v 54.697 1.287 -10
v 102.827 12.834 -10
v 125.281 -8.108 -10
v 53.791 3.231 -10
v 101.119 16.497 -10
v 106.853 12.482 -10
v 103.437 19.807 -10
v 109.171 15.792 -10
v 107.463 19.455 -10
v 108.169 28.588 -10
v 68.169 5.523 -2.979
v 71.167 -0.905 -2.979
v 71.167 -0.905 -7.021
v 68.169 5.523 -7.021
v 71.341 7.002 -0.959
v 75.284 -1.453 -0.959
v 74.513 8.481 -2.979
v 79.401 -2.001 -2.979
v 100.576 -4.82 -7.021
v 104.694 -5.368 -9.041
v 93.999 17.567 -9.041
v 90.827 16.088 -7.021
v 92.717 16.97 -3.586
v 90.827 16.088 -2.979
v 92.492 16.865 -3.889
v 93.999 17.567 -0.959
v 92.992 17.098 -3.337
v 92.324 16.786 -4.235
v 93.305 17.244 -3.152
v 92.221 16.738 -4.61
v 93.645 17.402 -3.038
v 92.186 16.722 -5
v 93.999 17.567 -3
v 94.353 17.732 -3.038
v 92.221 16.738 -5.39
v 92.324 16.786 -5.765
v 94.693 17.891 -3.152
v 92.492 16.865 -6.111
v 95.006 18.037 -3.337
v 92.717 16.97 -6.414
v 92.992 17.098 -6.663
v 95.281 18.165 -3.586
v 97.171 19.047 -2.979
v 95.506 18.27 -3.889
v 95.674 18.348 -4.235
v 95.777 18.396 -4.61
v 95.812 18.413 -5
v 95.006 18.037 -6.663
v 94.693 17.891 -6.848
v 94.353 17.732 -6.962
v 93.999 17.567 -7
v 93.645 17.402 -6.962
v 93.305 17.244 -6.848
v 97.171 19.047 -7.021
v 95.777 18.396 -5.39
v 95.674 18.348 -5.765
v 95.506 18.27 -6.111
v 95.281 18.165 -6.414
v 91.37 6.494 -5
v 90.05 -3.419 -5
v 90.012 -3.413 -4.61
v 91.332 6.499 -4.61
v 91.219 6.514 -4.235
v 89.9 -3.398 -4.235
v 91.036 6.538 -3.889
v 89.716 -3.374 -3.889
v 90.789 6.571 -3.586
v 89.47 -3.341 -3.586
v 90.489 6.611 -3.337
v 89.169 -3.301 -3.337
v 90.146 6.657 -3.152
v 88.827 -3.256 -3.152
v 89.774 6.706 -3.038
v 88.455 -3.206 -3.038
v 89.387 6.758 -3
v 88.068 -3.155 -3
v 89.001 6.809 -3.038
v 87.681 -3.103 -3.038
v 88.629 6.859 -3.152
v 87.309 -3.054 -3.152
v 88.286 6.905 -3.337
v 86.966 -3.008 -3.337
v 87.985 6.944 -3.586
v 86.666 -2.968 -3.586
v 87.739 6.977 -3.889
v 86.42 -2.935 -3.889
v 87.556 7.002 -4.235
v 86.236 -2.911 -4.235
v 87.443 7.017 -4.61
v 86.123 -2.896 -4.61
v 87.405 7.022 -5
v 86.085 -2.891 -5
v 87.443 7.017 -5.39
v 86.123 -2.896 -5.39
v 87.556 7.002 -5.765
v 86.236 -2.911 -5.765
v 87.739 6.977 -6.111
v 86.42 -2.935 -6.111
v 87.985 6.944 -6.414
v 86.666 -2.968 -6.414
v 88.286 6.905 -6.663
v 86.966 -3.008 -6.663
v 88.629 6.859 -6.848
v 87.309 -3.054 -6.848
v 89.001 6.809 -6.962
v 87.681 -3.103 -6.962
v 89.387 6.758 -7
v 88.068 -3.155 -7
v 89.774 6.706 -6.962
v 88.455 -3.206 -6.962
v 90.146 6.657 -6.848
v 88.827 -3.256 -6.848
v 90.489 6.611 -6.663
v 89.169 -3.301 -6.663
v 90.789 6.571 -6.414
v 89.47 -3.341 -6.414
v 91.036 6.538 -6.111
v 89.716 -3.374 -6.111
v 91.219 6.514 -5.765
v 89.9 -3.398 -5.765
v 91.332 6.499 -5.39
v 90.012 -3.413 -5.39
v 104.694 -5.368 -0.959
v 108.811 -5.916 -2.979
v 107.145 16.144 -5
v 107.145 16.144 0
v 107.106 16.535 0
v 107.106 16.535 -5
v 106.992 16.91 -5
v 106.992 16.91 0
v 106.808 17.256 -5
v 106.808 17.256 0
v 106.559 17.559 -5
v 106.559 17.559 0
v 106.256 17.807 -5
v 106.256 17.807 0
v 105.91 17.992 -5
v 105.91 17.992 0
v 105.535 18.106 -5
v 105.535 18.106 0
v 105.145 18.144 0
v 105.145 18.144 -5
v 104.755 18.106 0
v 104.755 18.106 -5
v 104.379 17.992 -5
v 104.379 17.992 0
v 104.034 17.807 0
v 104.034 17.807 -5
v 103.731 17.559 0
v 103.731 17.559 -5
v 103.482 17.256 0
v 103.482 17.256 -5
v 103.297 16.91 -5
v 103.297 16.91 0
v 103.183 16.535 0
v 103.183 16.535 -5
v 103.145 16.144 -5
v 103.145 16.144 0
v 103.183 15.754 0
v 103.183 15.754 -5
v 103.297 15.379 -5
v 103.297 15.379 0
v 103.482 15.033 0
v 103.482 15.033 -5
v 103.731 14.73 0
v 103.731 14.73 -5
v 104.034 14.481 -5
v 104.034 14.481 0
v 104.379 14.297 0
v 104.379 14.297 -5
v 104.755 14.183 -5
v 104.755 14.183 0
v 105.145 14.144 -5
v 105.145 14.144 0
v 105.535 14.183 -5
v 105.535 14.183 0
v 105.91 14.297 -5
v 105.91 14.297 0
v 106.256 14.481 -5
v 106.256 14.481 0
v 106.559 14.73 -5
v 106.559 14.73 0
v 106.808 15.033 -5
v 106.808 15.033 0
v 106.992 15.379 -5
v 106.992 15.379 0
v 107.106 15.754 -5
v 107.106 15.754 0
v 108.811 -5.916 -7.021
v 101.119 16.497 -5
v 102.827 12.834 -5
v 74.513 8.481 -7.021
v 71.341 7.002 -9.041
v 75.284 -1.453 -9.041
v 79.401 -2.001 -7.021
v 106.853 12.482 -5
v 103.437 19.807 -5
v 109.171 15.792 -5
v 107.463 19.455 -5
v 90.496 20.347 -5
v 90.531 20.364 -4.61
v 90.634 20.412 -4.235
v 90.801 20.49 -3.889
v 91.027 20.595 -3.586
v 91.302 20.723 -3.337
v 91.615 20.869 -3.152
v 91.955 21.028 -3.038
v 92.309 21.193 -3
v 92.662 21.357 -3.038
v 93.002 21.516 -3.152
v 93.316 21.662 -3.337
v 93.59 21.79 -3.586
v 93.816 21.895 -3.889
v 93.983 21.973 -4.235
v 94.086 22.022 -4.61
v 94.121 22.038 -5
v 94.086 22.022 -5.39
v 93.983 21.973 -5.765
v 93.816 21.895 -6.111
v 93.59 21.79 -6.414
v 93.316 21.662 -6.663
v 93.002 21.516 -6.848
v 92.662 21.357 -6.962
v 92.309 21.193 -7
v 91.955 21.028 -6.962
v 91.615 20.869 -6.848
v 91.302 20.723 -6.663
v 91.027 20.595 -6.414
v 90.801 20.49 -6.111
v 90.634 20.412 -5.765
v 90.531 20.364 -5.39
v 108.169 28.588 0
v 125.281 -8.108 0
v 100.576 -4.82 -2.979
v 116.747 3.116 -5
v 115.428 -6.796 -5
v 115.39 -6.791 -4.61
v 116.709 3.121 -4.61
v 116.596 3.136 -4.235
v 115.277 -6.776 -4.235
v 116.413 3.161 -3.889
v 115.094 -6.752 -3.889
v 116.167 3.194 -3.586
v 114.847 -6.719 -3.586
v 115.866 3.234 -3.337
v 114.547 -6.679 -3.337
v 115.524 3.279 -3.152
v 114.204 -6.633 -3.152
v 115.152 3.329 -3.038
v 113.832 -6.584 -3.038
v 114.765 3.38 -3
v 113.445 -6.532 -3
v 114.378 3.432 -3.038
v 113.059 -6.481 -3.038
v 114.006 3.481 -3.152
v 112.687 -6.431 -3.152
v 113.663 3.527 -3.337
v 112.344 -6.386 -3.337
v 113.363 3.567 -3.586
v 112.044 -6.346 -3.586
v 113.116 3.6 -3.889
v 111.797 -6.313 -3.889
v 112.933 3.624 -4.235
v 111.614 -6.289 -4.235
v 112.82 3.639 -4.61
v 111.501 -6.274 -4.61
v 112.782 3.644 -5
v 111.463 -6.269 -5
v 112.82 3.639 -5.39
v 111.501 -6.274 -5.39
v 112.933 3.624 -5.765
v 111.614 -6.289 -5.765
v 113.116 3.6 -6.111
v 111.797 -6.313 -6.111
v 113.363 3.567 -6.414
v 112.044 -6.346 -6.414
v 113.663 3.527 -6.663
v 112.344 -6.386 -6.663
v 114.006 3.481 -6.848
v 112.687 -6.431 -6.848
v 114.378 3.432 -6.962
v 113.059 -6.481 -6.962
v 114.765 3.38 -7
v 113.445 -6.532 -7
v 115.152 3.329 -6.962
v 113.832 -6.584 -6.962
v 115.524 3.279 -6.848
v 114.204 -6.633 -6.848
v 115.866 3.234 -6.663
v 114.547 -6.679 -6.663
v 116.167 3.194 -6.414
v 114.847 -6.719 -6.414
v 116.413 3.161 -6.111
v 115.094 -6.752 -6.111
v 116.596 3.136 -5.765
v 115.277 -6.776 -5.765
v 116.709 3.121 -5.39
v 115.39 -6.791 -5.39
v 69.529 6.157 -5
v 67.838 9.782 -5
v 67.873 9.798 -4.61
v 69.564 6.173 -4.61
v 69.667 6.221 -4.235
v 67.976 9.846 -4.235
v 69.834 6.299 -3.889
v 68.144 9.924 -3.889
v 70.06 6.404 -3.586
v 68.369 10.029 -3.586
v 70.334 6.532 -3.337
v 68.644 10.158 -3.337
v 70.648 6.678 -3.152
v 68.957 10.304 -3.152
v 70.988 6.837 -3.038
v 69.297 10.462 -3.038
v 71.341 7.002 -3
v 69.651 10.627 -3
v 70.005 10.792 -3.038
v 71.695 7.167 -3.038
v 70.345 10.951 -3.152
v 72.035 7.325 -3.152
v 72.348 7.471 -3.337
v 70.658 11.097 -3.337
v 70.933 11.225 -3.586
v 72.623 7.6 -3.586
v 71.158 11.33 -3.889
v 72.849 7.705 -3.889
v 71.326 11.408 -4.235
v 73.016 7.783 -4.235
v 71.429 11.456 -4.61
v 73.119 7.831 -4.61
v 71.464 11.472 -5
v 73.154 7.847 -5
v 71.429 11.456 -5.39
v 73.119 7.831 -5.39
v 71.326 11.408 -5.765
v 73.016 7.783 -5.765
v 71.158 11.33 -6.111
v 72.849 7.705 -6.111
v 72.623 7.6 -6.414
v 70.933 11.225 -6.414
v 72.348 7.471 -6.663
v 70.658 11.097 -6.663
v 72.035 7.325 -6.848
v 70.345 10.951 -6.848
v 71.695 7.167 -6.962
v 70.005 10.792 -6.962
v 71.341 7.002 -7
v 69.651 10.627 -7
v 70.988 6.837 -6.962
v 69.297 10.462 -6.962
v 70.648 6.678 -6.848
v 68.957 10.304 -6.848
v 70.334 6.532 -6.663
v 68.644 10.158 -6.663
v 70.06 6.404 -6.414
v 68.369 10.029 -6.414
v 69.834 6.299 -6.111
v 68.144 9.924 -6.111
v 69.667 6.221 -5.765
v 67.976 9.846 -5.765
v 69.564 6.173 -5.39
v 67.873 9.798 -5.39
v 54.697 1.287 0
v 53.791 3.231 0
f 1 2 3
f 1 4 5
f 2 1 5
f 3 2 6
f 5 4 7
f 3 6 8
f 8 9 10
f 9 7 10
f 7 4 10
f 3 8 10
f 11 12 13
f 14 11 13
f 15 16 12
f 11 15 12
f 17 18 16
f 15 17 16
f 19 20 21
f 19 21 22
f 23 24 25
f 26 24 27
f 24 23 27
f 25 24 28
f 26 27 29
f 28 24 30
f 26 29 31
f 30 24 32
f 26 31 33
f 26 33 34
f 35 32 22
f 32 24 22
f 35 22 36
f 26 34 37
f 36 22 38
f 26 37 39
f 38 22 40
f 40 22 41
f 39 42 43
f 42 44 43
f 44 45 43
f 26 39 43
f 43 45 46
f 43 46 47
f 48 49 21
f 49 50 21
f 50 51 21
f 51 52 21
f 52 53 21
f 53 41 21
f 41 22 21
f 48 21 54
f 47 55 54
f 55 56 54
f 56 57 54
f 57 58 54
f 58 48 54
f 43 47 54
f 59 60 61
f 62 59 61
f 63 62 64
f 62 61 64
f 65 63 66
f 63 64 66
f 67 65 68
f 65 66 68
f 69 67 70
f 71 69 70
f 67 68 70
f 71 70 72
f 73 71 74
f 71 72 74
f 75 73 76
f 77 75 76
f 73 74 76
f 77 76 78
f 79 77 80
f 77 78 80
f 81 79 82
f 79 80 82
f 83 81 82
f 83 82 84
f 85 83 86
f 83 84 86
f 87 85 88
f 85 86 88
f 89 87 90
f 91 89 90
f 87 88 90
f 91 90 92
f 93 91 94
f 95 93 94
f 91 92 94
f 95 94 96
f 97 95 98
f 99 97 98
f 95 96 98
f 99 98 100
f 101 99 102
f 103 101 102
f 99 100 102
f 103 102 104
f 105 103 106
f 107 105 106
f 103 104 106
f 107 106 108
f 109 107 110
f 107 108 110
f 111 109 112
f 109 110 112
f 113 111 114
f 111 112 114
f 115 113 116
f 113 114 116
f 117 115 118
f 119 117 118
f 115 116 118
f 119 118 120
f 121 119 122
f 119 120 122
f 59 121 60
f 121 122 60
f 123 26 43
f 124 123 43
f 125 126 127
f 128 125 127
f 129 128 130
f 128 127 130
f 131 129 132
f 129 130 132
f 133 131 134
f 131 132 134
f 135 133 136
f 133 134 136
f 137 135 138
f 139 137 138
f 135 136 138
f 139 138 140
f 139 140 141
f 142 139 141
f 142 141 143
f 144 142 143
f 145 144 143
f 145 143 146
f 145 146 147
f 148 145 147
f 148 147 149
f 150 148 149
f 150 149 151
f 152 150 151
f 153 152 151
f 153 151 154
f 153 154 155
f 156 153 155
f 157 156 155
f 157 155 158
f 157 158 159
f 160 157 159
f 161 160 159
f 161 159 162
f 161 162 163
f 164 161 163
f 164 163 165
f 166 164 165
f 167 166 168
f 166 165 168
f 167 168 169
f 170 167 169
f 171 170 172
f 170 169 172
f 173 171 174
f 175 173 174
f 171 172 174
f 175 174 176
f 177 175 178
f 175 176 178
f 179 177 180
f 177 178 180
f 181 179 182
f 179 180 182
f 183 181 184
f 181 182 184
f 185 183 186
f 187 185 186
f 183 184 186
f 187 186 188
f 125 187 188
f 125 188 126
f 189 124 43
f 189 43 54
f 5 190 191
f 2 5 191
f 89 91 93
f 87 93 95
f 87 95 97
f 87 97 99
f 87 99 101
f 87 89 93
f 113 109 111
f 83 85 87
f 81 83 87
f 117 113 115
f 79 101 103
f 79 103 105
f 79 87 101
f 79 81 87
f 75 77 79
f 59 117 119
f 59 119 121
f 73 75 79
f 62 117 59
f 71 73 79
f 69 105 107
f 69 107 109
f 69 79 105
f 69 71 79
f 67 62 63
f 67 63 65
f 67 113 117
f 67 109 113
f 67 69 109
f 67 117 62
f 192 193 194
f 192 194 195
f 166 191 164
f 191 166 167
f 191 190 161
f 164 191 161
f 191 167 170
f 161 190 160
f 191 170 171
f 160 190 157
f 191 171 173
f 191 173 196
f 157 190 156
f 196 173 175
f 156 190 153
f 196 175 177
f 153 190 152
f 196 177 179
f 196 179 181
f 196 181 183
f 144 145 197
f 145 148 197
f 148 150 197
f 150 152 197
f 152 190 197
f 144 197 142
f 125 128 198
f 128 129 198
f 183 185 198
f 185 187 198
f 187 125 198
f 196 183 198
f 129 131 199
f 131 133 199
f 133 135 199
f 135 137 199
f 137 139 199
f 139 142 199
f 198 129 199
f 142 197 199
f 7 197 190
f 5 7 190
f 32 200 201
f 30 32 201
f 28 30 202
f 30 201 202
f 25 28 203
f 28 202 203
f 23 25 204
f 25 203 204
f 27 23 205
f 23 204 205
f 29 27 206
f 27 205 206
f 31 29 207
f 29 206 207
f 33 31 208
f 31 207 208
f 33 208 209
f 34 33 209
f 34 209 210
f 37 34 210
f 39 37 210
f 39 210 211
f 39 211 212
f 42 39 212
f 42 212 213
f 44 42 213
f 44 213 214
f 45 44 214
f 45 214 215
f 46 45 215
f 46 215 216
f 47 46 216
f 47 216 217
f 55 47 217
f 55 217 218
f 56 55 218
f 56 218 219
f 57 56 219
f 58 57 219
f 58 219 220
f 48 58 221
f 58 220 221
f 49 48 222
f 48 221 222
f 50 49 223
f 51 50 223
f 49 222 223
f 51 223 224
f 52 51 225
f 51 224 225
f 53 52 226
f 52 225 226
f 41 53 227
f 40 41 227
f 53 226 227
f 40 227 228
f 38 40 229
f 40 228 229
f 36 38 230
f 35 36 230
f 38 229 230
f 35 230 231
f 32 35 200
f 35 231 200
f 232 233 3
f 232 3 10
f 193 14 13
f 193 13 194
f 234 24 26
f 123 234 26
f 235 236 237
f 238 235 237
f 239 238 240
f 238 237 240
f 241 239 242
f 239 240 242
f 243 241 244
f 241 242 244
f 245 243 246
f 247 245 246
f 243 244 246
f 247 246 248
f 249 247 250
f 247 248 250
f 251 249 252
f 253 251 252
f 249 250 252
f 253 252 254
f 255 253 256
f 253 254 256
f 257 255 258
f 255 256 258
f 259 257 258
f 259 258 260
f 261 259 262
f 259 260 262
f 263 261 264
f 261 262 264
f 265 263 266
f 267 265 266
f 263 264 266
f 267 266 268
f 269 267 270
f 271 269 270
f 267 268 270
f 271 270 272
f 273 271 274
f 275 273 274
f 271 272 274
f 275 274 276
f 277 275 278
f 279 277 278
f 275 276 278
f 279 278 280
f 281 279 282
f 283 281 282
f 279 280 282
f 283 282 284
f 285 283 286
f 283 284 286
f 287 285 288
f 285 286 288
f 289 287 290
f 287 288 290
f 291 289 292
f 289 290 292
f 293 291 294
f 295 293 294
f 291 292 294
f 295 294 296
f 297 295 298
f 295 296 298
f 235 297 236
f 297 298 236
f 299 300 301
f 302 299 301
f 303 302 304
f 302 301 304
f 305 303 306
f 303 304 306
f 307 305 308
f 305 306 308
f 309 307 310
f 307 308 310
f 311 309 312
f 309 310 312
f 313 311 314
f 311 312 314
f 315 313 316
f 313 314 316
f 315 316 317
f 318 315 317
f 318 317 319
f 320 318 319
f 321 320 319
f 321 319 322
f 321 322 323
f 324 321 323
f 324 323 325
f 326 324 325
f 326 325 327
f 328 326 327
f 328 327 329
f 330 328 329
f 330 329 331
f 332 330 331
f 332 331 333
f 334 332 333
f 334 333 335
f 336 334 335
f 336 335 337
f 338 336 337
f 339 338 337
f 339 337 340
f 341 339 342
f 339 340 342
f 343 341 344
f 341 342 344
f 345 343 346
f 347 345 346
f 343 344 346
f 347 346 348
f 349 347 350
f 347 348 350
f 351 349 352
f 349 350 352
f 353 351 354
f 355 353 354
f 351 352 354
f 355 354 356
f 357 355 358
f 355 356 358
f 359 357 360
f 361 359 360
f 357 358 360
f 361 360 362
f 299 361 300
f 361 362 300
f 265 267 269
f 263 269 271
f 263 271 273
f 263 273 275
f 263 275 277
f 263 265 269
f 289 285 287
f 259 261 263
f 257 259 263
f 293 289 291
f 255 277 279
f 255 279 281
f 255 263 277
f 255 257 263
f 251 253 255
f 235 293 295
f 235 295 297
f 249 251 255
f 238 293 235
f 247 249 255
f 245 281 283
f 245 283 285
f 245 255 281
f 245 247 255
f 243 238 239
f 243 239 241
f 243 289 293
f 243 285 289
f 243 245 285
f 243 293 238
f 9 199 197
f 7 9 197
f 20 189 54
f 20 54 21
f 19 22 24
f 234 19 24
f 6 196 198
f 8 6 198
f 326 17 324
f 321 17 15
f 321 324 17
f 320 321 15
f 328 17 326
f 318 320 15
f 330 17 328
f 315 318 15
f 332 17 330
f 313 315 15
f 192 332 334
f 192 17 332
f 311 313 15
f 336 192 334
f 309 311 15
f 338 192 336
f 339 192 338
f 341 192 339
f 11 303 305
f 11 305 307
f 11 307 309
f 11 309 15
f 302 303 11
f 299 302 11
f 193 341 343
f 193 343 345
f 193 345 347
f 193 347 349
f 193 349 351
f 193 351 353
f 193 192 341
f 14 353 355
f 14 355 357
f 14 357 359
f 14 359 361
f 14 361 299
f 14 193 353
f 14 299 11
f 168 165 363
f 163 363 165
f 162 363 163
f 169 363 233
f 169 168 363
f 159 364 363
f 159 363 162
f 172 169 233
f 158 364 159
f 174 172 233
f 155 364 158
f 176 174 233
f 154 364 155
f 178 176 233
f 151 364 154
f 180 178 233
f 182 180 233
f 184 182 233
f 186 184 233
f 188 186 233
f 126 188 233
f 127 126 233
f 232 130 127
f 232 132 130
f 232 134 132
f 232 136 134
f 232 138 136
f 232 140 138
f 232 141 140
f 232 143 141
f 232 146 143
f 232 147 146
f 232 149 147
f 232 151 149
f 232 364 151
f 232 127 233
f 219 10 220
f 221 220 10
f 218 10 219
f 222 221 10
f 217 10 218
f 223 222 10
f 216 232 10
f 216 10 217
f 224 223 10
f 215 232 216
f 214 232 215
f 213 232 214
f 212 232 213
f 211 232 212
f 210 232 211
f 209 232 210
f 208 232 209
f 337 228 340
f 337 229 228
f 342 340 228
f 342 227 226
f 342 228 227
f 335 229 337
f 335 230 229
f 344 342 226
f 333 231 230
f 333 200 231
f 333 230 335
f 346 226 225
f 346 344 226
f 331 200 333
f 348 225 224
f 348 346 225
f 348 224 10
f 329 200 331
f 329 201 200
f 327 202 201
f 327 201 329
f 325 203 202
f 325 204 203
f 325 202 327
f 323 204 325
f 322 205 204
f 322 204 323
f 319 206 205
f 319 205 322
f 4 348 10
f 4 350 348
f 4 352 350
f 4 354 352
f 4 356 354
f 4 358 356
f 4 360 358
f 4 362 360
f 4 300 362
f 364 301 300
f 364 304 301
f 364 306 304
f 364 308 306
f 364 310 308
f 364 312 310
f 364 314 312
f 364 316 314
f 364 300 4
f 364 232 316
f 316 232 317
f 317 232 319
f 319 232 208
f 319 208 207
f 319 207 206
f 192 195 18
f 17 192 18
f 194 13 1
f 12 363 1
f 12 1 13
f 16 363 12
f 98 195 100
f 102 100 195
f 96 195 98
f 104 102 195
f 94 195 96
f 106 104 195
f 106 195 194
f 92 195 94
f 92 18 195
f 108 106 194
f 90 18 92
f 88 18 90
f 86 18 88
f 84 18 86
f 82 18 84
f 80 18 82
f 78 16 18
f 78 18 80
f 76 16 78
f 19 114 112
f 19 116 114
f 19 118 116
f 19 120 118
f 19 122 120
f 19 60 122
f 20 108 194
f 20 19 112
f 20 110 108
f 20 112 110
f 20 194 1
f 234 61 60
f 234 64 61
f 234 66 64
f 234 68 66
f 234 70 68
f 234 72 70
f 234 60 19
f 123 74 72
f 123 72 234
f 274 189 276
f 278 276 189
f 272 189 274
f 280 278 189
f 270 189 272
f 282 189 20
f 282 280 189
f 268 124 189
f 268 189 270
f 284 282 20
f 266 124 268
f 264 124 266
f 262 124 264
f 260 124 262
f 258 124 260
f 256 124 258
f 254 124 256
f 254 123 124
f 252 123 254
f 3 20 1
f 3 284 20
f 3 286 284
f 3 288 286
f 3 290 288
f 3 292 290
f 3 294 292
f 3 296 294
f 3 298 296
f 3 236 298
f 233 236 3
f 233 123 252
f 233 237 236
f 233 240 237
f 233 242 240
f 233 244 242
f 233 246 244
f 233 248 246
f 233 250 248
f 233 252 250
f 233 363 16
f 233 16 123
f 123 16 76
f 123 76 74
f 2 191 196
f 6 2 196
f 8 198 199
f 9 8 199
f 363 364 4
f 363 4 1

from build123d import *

# Parameters (mm, degrees)
BOSS_EXTRUDE1_DEPTH = 10
SKETCH2_R           = 2
CUT_EXTRUDE1_DEPTH  = 127.229561877
CUT_EXTRUDE2_START  = -4
SKETCH2_3_R         = 2
CUT_EXTRUDE2_DEPTH  = 123.229561877
SKETCH3_R           = 2
CUT_EXTRUDE3_DEPTH  = 10
SKETCH4_R           = 2
CUT_EXTRUDE4_DEPTH  = 10
CUT_EXTRUDE5_START  = -5
SKETCH4_3_R         = 2
CUT_EXTRUDE5_DEPTH  = 5


with BuildPart() as part:
    # Sketch1 → Boss-Extrude1 (new body)
    with BuildSketch(Plane.XY):
        Polygon((125.280696375, -8.107729541), (108.169003487, 28.58841428), (53.790536264, 3.231318576), (54.697191201, 1.286990791), align=None)
    extrude(amount=-BOSS_EXTRUDE1_DEPTH)

    # Sketch2 → Cut-Extrude1 (cut, through all)
    with BuildSketch(Plane(origin=(8.369656198, -17.948785639, 0), x_dir=(0.9063077870366519, 0.4226182617406953, 0), z_dir=(-0.42261826174069533, 0.906307787036652, 0))):
        with Locations(Location((67.616396125, 5, 0), (0, 0, 180))):
            Circle(SKETCH2_R)
        with Locations(Location((92.616396125, 5, 0), (0, 0, 180))):
            Circle(SKETCH2_R)
    extrude(amount=-CUT_EXTRUDE1_DEPTH, mode=Mode.SUBTRACT)

    # Sketch2<3> → Cut-Extrude2 (cut, through all)
    # profile 1 of 2: a face of its own
    with BuildSketch(Plane(origin=(8.369656198, -17.948785639, 0), x_dir=(0.9063077870366519, 0.4226182617406953, 0), z_dir=(-0.42261826174069533, 0.906307787036652, 0)).offset(CUT_EXTRUDE2_START)):
        Polygon((92.616396125, 0.958548116), (96.116396125, 2.979274058), (96.116396125, 7.020725942), (92.616396125, 9.041451884), (89.116396125, 7.020725942), (89.116396125, 2.979274058), align=None)
        with Locations(Location((92.616396125, 5, 0), (0, 0, 180))):
            Circle(SKETCH2_3_R, mode=Mode.SUBTRACT)
    # profile 2 of 2: a face of its own
    with BuildSketch(Plane(origin=(8.369656198, -17.948785639, 0), x_dir=(0.9063077870366519, 0.4226182617406953, 0), z_dir=(-0.42261826174069533, 0.906307787036652, 0)).offset(CUT_EXTRUDE2_START)):
        Polygon((71.116396125, 2.979274058), (67.616396125, 0.958548116), (64.116396125, 2.979274058), (64.116396125, 7.020725942), (67.616396125, 9.041451884), (71.116396125, 7.020725942), align=None)
        with Locations(Location((67.616396125, 5, 0), (0, 0, 180))):
            Circle(SKETCH2_3_R, mode=Mode.SUBTRACT)
    extrude(amount=-CUT_EXTRUDE2_DEPTH, mode=Mode.SUBTRACT)

    # Sketch3 → Cut-Extrude3 (cut)
    with BuildSketch(Plane(origin=(1.120455323, 8.418096686, 0), x_dir=(0.9912580726255896, -0.1319372330110102, 0), z_dir=(-0.1319372330110102, -0.9912580726255896, 0))):
        with Locations((87.714258049, -5)):
            Circle(SKETCH3_R)
        with Locations((113.315595618, -5)):
            Circle(SKETCH3_R)
    extrude(amount=-CUT_EXTRUDE3_DEPTH, mode=Mode.SUBTRACT)

    # Sketch4 → Cut-Extrude4 (cut)
    with BuildSketch(Plane.XY):
        with Locations((105.144723808, 16.144390316)):
            Circle(SKETCH4_R)
    extrude(amount=-CUT_EXTRUDE4_DEPTH, mode=Mode.SUBTRACT)

    # Sketch4<3> → Cut-Extrude5 (cut)
    with BuildSketch(Plane.XY.offset(CUT_EXTRUDE5_START)):
        Polygon((109.170796748, 15.792154575), (107.462805377, 19.454953889), (103.436732437, 19.80718963), (101.118650868, 16.496626057), (102.826642238, 12.833826743), (106.852715178, 12.481591002), align=None)
        with Locations((105.144723808, 16.144390316)):
            Circle(SKETCH4_3_R, mode=Mode.SUBTRACT)
    extrude(amount=-CUT_EXTRUDE5_DEPTH, mode=Mode.SUBTRACT)


solid = part.part
